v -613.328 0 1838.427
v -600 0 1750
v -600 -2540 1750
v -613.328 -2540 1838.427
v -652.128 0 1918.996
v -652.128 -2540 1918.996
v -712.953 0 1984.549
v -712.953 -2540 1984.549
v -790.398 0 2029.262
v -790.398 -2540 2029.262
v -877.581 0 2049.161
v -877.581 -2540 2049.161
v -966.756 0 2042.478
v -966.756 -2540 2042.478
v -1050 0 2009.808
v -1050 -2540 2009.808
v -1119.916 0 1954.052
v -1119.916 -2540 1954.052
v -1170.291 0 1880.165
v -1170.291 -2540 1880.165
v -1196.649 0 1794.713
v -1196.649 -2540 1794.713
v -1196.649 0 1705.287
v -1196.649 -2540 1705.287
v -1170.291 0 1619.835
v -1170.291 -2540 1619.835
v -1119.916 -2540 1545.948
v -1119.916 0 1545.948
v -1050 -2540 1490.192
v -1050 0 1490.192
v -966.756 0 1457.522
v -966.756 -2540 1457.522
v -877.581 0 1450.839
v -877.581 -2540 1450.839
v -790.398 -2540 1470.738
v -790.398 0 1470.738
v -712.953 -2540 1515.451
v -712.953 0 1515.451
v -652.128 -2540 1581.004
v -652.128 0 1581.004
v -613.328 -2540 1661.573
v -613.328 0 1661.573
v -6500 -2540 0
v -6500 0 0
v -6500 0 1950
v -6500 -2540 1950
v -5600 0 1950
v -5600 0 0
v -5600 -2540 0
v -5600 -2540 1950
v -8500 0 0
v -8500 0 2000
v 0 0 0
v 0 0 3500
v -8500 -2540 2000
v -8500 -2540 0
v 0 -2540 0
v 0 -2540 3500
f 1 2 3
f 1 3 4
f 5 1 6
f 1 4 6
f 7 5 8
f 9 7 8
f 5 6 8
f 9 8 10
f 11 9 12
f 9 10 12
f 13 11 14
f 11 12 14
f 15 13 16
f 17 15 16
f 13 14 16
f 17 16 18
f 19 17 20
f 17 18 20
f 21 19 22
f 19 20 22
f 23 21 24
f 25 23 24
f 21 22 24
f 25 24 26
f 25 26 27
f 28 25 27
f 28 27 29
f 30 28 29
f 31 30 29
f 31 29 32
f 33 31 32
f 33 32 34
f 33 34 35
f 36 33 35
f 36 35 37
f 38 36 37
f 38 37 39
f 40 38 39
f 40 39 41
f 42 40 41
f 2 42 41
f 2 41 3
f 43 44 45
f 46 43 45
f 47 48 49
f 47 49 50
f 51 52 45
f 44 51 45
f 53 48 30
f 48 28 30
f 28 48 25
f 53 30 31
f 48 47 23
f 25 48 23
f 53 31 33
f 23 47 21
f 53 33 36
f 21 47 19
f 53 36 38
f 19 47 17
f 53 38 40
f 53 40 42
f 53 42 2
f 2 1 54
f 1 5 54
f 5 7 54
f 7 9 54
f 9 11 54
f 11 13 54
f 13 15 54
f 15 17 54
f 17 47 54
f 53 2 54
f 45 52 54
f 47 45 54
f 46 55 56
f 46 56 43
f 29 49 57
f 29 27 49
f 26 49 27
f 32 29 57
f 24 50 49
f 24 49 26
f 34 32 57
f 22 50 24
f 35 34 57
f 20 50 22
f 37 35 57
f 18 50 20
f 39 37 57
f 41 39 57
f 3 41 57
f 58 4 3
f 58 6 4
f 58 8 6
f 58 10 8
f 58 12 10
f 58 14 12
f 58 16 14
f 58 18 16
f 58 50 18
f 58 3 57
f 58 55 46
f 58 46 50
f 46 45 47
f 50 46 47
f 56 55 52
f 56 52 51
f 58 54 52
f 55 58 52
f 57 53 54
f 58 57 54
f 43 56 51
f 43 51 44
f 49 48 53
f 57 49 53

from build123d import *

# Parameters (mm, degrees)
F2_DEPTH = 2540
F1_W     = 900
F1_H     = 1950
F3_DEPTH = 2540.001
F4_R     = 300
F5_DEPTH = 2540.001


with BuildPart() as f2:
    # F0 (on Front) → F2 (new body)
    with BuildSketch(Plane.XZ):
        Polygon((-8500, 0), (0, 0), (0, 3500), (-8500, 2000), align=None)
    extrude(amount=F2_DEPTH)

    # F1 (on face) → F3 (cut, through all)
    with BuildSketch(Plane.XZ):
        with Locations((-6050, 975)):
            Rectangle(F1_W, F1_H)
    extrude(amount=F3_DEPTH, mode=Mode.SUBTRACT)

    # F4 (on face) → F5 (cut, through all)
    with BuildSketch(Plane.XZ.offset(2540)):
        with Locations((-900, 1750)):
            Circle(F4_R)
    extrude(amount=-F5_DEPTH, mode=Mode.SUBTRACT)


solid = f2.part
